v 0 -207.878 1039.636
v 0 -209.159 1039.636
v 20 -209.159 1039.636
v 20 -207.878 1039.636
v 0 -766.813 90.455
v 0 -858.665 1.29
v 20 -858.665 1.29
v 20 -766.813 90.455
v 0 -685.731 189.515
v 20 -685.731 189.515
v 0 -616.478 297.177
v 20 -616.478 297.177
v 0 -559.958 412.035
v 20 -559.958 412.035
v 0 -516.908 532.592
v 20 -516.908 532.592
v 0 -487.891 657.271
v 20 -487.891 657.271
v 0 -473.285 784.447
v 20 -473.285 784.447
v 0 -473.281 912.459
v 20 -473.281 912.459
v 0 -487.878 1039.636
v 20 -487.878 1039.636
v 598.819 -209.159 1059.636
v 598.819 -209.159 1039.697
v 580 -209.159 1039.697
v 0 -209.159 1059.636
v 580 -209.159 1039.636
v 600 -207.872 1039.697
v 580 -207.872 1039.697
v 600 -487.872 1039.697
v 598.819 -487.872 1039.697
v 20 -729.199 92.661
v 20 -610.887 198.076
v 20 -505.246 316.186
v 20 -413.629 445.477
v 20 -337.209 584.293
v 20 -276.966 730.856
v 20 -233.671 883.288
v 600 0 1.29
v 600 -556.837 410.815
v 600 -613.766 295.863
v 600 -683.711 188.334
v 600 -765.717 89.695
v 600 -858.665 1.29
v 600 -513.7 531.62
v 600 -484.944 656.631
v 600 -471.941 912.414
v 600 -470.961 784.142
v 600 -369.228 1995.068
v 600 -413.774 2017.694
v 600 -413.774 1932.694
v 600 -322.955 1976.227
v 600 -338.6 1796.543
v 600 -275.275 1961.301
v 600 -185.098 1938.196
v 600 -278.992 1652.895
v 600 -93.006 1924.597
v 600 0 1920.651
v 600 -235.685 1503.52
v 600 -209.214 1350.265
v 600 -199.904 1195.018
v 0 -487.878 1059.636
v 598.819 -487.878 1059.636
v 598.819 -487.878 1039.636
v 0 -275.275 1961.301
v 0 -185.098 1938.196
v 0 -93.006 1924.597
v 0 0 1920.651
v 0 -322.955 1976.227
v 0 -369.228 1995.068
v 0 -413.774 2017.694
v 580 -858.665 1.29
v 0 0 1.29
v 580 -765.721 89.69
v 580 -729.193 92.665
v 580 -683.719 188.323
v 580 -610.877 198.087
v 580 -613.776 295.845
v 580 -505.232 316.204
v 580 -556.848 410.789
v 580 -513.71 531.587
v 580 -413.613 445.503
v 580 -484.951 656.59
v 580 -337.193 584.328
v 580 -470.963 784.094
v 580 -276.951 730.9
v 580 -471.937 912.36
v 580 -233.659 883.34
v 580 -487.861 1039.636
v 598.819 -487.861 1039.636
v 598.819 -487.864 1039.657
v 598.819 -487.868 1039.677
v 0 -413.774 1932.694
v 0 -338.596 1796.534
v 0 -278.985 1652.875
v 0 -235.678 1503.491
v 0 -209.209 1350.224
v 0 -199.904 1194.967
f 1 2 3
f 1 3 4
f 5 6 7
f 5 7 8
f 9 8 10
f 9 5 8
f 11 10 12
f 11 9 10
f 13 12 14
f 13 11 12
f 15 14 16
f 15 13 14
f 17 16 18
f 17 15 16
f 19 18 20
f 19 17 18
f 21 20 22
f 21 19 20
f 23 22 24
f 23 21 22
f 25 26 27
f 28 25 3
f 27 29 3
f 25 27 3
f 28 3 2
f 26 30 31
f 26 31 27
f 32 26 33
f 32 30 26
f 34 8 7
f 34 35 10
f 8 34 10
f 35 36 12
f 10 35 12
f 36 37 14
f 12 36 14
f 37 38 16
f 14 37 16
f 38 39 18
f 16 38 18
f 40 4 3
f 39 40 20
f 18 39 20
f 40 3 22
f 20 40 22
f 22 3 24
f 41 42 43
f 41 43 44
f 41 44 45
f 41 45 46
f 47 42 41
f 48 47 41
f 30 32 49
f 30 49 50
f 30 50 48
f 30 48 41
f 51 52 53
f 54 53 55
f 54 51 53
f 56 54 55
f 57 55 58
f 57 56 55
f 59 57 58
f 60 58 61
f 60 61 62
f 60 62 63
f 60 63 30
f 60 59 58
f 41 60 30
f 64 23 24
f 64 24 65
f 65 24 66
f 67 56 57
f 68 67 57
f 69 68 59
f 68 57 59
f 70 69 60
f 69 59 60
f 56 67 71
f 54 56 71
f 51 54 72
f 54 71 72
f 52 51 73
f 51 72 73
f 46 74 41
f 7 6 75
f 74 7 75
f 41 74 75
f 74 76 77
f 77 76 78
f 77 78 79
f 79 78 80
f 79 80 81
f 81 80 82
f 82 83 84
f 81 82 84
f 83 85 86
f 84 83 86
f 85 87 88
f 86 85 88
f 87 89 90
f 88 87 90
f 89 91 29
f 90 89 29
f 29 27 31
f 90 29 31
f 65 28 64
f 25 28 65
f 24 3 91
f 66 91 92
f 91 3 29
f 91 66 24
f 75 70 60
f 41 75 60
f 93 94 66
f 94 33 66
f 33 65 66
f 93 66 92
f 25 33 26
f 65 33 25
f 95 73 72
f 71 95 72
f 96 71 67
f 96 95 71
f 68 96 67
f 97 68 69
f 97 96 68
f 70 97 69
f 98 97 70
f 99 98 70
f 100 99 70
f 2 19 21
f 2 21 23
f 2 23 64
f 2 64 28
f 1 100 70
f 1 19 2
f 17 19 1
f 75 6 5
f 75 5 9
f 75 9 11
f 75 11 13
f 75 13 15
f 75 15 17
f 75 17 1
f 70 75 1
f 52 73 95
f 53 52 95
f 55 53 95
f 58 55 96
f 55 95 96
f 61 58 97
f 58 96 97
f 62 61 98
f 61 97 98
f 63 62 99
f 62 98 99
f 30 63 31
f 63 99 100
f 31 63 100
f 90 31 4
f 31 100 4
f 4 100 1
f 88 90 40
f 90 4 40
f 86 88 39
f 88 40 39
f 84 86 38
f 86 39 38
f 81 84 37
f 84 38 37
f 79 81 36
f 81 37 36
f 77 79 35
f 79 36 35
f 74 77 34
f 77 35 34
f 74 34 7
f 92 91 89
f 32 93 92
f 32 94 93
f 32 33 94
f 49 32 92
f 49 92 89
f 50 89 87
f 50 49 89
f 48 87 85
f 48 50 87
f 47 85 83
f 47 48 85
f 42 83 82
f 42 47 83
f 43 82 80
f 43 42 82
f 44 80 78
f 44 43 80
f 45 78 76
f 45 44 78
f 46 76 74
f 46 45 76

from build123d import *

# Parameters (mm, degrees)
F1_DEPTH  = 600
F3_DEPTH  = 600.001
F5_DEPTH  = 20
F7_DEPTH  = 20
F8_W      = 20
F8_H      = 278.7190201738
F8_W_2    = 578.8190174103
F9_DEPTH  = 20
F10_W     = 598.5316634178
F10_H     = 254.7840774059
F11_DEPTH = 2017.6951884178


# Not quite as in the source:
# - a feature names something its author has since deleted; it is built from what else it names


with BuildPart() as f1:
    # F0 (on Right) → F1 (new body)
    with BuildSketch(Plane.YZ):
        with BuildLine():
            ThreePointArc((-413.7737442203, 1932.6941884178), (-235.6171133469, 874.7152717166), (-858.6646769196, 1.2904570733))
            Line((-858.6646769196, 1.2904570733), (841.3353230804, 1.2904570733))
            ThreePointArc((841.3353230804, 1.2904570733), (218.2877610308, 874.7152723164), (396.4443930804, 1932.6941884178))
            Line((396.4443930804, 1932.6941884178), (396.4443930804, 2017.6941884178))
            ThreePointArc((396.4443930804, 2017.6941884178), (199.7456261802, 1948.7680536266), (-8.6646769196, 1951.2904570733))
            ThreePointArc((-8.6646769196, 1951.2904570733), (-217.0749786293, 1948.7680541113), (-413.7737442203, 2017.6941884178))
            Line((-413.7737442203, 2017.6941884178), (-413.7737442203, 1932.6941884178))
        make_face()
    extrude(amount=F1_DEPTH)

    # F2 (on face) → F3 (cut, through all)
    with BuildSketch(Plane.YZ.offset(600)):
        with BuildLine():
            Line((396.4443930804, 2017.6941884178), (-413.7737442203, 2017.6941884178))
            ThreePointArc((-413.7737442203, 2017.6941884178), (-345.7057427079, 1986.5957603046), (-275.2746839195, 1961.3008790249))
            ThreePointArc((-275.2746839195, 1961.3008790249), (-142.5331399832, 1941.2889121961), (-8.6646769196, 1951.2904570733))
            ThreePointArc((-8.6646769196, 1951.2904570733), (125.2037851776, 1941.2889117025), (257.9453283126, 1961.3008776288))
            ThreePointArc((257.9453283126, 1961.3008776288), (328.3763894007, 1986.5957594221), (396.4443930804, 2017.6941884178))
        make_face()
        with BuildLine():
            ThreePointArc((-8.6646769196, 1951.2904570733), (-142.5331399832, 1941.2889121961), (-275.2746839195, 1961.3008790249))
            ThreePointArc((-275.2746839195, 1961.3008790249), (-8.66467791, 1920.6086514411), (257.9453283126, 1961.3008776288))
            ThreePointArc((257.9453283126, 1961.3008776288), (125.2037851776, 1941.2889117025), (-8.6646769196, 1951.2904570733))
        make_face()
    extrude(amount=-F3_DEPTH, mode=Mode.SUBTRACT)

    # F4 (on face) → F5 (join)
    with BuildSketch(Plane.YZ.offset(600)):
        with BuildLine():
            ThreePointArc((-487.8719790556, 1039.6971702576), (-533.5033840935, 470.5867589871), (-858.6646769196, 1.2904570733))
            ThreePointArc((-858.6646769196, 1.2904570733), (-413.6127871917, 445.5030116798), (-207.8719790556, 1039.6971702576))
            Line((-207.8719790556, 1039.6971702576), (-487.8719790556, 1039.6971702576))
        make_face()
        with BuildLine():
            ThreePointArc((190.5426270267, 1039.6971702576), (396.283434362, 445.5030119538), (841.3353230804, 1.2904570733))
            ThreePointArc((841.3353230804, 1.2904570733), (516.1740306428, 470.5867590462), (470.5426270267, 1039.6971702576))
            Line((470.5426270267, 1039.6971702576), (190.5426270267, 1039.6971702576))
        make_face()
    extrude(amount=-F5_DEPTH)

    # F6 (on face) → F7 (join)
    with BuildSketch(Plane(origin=(0, 0, 0), x_dir=(0, -1, 0), z_dir=(-1, 0, 0))):
        with BuildLine():
            ThreePointArc((-841.3353230804, 1.2904570733), (-396.5475396439, 445.0817710452), (-190.6490020093, 1038.7085012816))
            Line((-190.6490020093, 1038.7085012816), (-470.6490020093, 1038.7085012816))
            ThreePointArc((-470.6490020093, 1038.7085012816), (-519.6815928842, 471.2934981386), (-841.3353230804, 1.2904570733))
        make_face()
        with BuildLine():
            ThreePointArc((207.878498719, 1039.6363848164), (413.6290200403, 445.4771111279), (858.6646769196, 1.2904570733))
            ThreePointArc((858.6646769196, 1.2904570733), (536.7100272294, 471.698228356), (487.878498719, 1039.6363848164))
            Line((487.878498719, 1039.6363848164), (207.878498719, 1039.6363848164))
        make_face()
    extrude(amount=-F7_DEPTH)

    # F8 (on face) → F9 (join)
    with BuildSketch(Plane.XY.offset(1039.6363848164)):
        with Locations((10, -348.5189886321)):
            Rectangle(F8_W, F8_H)
        with Locations((309.4095087051, -348.5189886321)):
            Rectangle(F8_W_2, F8_H)
    extrude(amount=F9_DEPTH)

    # F10 (on Top) → F11 (cut, through all)
    with BuildSketch(Plane.XY):
        Polygon((0, 963.8522267342), (0, 254.7840774059), (598.5316634178, 254.7840774059), (598.5316634178, 0), (664.8825407028, 0), (664.8825407028, 963.8522267342), align=None)
        Polygon((-87.8282785416, 0), (0, 0), (0, 254.7840774059), (0, 963.8522267342), (-87.8282785416, 963.8522267342), align=None)
        with Locations((299.2658317089, 127.392038703)):
            Rectangle(F10_W, F10_H)
    extrude(amount=F11_DEPTH, mode=Mode.SUBTRACT)


solid = f1.part
